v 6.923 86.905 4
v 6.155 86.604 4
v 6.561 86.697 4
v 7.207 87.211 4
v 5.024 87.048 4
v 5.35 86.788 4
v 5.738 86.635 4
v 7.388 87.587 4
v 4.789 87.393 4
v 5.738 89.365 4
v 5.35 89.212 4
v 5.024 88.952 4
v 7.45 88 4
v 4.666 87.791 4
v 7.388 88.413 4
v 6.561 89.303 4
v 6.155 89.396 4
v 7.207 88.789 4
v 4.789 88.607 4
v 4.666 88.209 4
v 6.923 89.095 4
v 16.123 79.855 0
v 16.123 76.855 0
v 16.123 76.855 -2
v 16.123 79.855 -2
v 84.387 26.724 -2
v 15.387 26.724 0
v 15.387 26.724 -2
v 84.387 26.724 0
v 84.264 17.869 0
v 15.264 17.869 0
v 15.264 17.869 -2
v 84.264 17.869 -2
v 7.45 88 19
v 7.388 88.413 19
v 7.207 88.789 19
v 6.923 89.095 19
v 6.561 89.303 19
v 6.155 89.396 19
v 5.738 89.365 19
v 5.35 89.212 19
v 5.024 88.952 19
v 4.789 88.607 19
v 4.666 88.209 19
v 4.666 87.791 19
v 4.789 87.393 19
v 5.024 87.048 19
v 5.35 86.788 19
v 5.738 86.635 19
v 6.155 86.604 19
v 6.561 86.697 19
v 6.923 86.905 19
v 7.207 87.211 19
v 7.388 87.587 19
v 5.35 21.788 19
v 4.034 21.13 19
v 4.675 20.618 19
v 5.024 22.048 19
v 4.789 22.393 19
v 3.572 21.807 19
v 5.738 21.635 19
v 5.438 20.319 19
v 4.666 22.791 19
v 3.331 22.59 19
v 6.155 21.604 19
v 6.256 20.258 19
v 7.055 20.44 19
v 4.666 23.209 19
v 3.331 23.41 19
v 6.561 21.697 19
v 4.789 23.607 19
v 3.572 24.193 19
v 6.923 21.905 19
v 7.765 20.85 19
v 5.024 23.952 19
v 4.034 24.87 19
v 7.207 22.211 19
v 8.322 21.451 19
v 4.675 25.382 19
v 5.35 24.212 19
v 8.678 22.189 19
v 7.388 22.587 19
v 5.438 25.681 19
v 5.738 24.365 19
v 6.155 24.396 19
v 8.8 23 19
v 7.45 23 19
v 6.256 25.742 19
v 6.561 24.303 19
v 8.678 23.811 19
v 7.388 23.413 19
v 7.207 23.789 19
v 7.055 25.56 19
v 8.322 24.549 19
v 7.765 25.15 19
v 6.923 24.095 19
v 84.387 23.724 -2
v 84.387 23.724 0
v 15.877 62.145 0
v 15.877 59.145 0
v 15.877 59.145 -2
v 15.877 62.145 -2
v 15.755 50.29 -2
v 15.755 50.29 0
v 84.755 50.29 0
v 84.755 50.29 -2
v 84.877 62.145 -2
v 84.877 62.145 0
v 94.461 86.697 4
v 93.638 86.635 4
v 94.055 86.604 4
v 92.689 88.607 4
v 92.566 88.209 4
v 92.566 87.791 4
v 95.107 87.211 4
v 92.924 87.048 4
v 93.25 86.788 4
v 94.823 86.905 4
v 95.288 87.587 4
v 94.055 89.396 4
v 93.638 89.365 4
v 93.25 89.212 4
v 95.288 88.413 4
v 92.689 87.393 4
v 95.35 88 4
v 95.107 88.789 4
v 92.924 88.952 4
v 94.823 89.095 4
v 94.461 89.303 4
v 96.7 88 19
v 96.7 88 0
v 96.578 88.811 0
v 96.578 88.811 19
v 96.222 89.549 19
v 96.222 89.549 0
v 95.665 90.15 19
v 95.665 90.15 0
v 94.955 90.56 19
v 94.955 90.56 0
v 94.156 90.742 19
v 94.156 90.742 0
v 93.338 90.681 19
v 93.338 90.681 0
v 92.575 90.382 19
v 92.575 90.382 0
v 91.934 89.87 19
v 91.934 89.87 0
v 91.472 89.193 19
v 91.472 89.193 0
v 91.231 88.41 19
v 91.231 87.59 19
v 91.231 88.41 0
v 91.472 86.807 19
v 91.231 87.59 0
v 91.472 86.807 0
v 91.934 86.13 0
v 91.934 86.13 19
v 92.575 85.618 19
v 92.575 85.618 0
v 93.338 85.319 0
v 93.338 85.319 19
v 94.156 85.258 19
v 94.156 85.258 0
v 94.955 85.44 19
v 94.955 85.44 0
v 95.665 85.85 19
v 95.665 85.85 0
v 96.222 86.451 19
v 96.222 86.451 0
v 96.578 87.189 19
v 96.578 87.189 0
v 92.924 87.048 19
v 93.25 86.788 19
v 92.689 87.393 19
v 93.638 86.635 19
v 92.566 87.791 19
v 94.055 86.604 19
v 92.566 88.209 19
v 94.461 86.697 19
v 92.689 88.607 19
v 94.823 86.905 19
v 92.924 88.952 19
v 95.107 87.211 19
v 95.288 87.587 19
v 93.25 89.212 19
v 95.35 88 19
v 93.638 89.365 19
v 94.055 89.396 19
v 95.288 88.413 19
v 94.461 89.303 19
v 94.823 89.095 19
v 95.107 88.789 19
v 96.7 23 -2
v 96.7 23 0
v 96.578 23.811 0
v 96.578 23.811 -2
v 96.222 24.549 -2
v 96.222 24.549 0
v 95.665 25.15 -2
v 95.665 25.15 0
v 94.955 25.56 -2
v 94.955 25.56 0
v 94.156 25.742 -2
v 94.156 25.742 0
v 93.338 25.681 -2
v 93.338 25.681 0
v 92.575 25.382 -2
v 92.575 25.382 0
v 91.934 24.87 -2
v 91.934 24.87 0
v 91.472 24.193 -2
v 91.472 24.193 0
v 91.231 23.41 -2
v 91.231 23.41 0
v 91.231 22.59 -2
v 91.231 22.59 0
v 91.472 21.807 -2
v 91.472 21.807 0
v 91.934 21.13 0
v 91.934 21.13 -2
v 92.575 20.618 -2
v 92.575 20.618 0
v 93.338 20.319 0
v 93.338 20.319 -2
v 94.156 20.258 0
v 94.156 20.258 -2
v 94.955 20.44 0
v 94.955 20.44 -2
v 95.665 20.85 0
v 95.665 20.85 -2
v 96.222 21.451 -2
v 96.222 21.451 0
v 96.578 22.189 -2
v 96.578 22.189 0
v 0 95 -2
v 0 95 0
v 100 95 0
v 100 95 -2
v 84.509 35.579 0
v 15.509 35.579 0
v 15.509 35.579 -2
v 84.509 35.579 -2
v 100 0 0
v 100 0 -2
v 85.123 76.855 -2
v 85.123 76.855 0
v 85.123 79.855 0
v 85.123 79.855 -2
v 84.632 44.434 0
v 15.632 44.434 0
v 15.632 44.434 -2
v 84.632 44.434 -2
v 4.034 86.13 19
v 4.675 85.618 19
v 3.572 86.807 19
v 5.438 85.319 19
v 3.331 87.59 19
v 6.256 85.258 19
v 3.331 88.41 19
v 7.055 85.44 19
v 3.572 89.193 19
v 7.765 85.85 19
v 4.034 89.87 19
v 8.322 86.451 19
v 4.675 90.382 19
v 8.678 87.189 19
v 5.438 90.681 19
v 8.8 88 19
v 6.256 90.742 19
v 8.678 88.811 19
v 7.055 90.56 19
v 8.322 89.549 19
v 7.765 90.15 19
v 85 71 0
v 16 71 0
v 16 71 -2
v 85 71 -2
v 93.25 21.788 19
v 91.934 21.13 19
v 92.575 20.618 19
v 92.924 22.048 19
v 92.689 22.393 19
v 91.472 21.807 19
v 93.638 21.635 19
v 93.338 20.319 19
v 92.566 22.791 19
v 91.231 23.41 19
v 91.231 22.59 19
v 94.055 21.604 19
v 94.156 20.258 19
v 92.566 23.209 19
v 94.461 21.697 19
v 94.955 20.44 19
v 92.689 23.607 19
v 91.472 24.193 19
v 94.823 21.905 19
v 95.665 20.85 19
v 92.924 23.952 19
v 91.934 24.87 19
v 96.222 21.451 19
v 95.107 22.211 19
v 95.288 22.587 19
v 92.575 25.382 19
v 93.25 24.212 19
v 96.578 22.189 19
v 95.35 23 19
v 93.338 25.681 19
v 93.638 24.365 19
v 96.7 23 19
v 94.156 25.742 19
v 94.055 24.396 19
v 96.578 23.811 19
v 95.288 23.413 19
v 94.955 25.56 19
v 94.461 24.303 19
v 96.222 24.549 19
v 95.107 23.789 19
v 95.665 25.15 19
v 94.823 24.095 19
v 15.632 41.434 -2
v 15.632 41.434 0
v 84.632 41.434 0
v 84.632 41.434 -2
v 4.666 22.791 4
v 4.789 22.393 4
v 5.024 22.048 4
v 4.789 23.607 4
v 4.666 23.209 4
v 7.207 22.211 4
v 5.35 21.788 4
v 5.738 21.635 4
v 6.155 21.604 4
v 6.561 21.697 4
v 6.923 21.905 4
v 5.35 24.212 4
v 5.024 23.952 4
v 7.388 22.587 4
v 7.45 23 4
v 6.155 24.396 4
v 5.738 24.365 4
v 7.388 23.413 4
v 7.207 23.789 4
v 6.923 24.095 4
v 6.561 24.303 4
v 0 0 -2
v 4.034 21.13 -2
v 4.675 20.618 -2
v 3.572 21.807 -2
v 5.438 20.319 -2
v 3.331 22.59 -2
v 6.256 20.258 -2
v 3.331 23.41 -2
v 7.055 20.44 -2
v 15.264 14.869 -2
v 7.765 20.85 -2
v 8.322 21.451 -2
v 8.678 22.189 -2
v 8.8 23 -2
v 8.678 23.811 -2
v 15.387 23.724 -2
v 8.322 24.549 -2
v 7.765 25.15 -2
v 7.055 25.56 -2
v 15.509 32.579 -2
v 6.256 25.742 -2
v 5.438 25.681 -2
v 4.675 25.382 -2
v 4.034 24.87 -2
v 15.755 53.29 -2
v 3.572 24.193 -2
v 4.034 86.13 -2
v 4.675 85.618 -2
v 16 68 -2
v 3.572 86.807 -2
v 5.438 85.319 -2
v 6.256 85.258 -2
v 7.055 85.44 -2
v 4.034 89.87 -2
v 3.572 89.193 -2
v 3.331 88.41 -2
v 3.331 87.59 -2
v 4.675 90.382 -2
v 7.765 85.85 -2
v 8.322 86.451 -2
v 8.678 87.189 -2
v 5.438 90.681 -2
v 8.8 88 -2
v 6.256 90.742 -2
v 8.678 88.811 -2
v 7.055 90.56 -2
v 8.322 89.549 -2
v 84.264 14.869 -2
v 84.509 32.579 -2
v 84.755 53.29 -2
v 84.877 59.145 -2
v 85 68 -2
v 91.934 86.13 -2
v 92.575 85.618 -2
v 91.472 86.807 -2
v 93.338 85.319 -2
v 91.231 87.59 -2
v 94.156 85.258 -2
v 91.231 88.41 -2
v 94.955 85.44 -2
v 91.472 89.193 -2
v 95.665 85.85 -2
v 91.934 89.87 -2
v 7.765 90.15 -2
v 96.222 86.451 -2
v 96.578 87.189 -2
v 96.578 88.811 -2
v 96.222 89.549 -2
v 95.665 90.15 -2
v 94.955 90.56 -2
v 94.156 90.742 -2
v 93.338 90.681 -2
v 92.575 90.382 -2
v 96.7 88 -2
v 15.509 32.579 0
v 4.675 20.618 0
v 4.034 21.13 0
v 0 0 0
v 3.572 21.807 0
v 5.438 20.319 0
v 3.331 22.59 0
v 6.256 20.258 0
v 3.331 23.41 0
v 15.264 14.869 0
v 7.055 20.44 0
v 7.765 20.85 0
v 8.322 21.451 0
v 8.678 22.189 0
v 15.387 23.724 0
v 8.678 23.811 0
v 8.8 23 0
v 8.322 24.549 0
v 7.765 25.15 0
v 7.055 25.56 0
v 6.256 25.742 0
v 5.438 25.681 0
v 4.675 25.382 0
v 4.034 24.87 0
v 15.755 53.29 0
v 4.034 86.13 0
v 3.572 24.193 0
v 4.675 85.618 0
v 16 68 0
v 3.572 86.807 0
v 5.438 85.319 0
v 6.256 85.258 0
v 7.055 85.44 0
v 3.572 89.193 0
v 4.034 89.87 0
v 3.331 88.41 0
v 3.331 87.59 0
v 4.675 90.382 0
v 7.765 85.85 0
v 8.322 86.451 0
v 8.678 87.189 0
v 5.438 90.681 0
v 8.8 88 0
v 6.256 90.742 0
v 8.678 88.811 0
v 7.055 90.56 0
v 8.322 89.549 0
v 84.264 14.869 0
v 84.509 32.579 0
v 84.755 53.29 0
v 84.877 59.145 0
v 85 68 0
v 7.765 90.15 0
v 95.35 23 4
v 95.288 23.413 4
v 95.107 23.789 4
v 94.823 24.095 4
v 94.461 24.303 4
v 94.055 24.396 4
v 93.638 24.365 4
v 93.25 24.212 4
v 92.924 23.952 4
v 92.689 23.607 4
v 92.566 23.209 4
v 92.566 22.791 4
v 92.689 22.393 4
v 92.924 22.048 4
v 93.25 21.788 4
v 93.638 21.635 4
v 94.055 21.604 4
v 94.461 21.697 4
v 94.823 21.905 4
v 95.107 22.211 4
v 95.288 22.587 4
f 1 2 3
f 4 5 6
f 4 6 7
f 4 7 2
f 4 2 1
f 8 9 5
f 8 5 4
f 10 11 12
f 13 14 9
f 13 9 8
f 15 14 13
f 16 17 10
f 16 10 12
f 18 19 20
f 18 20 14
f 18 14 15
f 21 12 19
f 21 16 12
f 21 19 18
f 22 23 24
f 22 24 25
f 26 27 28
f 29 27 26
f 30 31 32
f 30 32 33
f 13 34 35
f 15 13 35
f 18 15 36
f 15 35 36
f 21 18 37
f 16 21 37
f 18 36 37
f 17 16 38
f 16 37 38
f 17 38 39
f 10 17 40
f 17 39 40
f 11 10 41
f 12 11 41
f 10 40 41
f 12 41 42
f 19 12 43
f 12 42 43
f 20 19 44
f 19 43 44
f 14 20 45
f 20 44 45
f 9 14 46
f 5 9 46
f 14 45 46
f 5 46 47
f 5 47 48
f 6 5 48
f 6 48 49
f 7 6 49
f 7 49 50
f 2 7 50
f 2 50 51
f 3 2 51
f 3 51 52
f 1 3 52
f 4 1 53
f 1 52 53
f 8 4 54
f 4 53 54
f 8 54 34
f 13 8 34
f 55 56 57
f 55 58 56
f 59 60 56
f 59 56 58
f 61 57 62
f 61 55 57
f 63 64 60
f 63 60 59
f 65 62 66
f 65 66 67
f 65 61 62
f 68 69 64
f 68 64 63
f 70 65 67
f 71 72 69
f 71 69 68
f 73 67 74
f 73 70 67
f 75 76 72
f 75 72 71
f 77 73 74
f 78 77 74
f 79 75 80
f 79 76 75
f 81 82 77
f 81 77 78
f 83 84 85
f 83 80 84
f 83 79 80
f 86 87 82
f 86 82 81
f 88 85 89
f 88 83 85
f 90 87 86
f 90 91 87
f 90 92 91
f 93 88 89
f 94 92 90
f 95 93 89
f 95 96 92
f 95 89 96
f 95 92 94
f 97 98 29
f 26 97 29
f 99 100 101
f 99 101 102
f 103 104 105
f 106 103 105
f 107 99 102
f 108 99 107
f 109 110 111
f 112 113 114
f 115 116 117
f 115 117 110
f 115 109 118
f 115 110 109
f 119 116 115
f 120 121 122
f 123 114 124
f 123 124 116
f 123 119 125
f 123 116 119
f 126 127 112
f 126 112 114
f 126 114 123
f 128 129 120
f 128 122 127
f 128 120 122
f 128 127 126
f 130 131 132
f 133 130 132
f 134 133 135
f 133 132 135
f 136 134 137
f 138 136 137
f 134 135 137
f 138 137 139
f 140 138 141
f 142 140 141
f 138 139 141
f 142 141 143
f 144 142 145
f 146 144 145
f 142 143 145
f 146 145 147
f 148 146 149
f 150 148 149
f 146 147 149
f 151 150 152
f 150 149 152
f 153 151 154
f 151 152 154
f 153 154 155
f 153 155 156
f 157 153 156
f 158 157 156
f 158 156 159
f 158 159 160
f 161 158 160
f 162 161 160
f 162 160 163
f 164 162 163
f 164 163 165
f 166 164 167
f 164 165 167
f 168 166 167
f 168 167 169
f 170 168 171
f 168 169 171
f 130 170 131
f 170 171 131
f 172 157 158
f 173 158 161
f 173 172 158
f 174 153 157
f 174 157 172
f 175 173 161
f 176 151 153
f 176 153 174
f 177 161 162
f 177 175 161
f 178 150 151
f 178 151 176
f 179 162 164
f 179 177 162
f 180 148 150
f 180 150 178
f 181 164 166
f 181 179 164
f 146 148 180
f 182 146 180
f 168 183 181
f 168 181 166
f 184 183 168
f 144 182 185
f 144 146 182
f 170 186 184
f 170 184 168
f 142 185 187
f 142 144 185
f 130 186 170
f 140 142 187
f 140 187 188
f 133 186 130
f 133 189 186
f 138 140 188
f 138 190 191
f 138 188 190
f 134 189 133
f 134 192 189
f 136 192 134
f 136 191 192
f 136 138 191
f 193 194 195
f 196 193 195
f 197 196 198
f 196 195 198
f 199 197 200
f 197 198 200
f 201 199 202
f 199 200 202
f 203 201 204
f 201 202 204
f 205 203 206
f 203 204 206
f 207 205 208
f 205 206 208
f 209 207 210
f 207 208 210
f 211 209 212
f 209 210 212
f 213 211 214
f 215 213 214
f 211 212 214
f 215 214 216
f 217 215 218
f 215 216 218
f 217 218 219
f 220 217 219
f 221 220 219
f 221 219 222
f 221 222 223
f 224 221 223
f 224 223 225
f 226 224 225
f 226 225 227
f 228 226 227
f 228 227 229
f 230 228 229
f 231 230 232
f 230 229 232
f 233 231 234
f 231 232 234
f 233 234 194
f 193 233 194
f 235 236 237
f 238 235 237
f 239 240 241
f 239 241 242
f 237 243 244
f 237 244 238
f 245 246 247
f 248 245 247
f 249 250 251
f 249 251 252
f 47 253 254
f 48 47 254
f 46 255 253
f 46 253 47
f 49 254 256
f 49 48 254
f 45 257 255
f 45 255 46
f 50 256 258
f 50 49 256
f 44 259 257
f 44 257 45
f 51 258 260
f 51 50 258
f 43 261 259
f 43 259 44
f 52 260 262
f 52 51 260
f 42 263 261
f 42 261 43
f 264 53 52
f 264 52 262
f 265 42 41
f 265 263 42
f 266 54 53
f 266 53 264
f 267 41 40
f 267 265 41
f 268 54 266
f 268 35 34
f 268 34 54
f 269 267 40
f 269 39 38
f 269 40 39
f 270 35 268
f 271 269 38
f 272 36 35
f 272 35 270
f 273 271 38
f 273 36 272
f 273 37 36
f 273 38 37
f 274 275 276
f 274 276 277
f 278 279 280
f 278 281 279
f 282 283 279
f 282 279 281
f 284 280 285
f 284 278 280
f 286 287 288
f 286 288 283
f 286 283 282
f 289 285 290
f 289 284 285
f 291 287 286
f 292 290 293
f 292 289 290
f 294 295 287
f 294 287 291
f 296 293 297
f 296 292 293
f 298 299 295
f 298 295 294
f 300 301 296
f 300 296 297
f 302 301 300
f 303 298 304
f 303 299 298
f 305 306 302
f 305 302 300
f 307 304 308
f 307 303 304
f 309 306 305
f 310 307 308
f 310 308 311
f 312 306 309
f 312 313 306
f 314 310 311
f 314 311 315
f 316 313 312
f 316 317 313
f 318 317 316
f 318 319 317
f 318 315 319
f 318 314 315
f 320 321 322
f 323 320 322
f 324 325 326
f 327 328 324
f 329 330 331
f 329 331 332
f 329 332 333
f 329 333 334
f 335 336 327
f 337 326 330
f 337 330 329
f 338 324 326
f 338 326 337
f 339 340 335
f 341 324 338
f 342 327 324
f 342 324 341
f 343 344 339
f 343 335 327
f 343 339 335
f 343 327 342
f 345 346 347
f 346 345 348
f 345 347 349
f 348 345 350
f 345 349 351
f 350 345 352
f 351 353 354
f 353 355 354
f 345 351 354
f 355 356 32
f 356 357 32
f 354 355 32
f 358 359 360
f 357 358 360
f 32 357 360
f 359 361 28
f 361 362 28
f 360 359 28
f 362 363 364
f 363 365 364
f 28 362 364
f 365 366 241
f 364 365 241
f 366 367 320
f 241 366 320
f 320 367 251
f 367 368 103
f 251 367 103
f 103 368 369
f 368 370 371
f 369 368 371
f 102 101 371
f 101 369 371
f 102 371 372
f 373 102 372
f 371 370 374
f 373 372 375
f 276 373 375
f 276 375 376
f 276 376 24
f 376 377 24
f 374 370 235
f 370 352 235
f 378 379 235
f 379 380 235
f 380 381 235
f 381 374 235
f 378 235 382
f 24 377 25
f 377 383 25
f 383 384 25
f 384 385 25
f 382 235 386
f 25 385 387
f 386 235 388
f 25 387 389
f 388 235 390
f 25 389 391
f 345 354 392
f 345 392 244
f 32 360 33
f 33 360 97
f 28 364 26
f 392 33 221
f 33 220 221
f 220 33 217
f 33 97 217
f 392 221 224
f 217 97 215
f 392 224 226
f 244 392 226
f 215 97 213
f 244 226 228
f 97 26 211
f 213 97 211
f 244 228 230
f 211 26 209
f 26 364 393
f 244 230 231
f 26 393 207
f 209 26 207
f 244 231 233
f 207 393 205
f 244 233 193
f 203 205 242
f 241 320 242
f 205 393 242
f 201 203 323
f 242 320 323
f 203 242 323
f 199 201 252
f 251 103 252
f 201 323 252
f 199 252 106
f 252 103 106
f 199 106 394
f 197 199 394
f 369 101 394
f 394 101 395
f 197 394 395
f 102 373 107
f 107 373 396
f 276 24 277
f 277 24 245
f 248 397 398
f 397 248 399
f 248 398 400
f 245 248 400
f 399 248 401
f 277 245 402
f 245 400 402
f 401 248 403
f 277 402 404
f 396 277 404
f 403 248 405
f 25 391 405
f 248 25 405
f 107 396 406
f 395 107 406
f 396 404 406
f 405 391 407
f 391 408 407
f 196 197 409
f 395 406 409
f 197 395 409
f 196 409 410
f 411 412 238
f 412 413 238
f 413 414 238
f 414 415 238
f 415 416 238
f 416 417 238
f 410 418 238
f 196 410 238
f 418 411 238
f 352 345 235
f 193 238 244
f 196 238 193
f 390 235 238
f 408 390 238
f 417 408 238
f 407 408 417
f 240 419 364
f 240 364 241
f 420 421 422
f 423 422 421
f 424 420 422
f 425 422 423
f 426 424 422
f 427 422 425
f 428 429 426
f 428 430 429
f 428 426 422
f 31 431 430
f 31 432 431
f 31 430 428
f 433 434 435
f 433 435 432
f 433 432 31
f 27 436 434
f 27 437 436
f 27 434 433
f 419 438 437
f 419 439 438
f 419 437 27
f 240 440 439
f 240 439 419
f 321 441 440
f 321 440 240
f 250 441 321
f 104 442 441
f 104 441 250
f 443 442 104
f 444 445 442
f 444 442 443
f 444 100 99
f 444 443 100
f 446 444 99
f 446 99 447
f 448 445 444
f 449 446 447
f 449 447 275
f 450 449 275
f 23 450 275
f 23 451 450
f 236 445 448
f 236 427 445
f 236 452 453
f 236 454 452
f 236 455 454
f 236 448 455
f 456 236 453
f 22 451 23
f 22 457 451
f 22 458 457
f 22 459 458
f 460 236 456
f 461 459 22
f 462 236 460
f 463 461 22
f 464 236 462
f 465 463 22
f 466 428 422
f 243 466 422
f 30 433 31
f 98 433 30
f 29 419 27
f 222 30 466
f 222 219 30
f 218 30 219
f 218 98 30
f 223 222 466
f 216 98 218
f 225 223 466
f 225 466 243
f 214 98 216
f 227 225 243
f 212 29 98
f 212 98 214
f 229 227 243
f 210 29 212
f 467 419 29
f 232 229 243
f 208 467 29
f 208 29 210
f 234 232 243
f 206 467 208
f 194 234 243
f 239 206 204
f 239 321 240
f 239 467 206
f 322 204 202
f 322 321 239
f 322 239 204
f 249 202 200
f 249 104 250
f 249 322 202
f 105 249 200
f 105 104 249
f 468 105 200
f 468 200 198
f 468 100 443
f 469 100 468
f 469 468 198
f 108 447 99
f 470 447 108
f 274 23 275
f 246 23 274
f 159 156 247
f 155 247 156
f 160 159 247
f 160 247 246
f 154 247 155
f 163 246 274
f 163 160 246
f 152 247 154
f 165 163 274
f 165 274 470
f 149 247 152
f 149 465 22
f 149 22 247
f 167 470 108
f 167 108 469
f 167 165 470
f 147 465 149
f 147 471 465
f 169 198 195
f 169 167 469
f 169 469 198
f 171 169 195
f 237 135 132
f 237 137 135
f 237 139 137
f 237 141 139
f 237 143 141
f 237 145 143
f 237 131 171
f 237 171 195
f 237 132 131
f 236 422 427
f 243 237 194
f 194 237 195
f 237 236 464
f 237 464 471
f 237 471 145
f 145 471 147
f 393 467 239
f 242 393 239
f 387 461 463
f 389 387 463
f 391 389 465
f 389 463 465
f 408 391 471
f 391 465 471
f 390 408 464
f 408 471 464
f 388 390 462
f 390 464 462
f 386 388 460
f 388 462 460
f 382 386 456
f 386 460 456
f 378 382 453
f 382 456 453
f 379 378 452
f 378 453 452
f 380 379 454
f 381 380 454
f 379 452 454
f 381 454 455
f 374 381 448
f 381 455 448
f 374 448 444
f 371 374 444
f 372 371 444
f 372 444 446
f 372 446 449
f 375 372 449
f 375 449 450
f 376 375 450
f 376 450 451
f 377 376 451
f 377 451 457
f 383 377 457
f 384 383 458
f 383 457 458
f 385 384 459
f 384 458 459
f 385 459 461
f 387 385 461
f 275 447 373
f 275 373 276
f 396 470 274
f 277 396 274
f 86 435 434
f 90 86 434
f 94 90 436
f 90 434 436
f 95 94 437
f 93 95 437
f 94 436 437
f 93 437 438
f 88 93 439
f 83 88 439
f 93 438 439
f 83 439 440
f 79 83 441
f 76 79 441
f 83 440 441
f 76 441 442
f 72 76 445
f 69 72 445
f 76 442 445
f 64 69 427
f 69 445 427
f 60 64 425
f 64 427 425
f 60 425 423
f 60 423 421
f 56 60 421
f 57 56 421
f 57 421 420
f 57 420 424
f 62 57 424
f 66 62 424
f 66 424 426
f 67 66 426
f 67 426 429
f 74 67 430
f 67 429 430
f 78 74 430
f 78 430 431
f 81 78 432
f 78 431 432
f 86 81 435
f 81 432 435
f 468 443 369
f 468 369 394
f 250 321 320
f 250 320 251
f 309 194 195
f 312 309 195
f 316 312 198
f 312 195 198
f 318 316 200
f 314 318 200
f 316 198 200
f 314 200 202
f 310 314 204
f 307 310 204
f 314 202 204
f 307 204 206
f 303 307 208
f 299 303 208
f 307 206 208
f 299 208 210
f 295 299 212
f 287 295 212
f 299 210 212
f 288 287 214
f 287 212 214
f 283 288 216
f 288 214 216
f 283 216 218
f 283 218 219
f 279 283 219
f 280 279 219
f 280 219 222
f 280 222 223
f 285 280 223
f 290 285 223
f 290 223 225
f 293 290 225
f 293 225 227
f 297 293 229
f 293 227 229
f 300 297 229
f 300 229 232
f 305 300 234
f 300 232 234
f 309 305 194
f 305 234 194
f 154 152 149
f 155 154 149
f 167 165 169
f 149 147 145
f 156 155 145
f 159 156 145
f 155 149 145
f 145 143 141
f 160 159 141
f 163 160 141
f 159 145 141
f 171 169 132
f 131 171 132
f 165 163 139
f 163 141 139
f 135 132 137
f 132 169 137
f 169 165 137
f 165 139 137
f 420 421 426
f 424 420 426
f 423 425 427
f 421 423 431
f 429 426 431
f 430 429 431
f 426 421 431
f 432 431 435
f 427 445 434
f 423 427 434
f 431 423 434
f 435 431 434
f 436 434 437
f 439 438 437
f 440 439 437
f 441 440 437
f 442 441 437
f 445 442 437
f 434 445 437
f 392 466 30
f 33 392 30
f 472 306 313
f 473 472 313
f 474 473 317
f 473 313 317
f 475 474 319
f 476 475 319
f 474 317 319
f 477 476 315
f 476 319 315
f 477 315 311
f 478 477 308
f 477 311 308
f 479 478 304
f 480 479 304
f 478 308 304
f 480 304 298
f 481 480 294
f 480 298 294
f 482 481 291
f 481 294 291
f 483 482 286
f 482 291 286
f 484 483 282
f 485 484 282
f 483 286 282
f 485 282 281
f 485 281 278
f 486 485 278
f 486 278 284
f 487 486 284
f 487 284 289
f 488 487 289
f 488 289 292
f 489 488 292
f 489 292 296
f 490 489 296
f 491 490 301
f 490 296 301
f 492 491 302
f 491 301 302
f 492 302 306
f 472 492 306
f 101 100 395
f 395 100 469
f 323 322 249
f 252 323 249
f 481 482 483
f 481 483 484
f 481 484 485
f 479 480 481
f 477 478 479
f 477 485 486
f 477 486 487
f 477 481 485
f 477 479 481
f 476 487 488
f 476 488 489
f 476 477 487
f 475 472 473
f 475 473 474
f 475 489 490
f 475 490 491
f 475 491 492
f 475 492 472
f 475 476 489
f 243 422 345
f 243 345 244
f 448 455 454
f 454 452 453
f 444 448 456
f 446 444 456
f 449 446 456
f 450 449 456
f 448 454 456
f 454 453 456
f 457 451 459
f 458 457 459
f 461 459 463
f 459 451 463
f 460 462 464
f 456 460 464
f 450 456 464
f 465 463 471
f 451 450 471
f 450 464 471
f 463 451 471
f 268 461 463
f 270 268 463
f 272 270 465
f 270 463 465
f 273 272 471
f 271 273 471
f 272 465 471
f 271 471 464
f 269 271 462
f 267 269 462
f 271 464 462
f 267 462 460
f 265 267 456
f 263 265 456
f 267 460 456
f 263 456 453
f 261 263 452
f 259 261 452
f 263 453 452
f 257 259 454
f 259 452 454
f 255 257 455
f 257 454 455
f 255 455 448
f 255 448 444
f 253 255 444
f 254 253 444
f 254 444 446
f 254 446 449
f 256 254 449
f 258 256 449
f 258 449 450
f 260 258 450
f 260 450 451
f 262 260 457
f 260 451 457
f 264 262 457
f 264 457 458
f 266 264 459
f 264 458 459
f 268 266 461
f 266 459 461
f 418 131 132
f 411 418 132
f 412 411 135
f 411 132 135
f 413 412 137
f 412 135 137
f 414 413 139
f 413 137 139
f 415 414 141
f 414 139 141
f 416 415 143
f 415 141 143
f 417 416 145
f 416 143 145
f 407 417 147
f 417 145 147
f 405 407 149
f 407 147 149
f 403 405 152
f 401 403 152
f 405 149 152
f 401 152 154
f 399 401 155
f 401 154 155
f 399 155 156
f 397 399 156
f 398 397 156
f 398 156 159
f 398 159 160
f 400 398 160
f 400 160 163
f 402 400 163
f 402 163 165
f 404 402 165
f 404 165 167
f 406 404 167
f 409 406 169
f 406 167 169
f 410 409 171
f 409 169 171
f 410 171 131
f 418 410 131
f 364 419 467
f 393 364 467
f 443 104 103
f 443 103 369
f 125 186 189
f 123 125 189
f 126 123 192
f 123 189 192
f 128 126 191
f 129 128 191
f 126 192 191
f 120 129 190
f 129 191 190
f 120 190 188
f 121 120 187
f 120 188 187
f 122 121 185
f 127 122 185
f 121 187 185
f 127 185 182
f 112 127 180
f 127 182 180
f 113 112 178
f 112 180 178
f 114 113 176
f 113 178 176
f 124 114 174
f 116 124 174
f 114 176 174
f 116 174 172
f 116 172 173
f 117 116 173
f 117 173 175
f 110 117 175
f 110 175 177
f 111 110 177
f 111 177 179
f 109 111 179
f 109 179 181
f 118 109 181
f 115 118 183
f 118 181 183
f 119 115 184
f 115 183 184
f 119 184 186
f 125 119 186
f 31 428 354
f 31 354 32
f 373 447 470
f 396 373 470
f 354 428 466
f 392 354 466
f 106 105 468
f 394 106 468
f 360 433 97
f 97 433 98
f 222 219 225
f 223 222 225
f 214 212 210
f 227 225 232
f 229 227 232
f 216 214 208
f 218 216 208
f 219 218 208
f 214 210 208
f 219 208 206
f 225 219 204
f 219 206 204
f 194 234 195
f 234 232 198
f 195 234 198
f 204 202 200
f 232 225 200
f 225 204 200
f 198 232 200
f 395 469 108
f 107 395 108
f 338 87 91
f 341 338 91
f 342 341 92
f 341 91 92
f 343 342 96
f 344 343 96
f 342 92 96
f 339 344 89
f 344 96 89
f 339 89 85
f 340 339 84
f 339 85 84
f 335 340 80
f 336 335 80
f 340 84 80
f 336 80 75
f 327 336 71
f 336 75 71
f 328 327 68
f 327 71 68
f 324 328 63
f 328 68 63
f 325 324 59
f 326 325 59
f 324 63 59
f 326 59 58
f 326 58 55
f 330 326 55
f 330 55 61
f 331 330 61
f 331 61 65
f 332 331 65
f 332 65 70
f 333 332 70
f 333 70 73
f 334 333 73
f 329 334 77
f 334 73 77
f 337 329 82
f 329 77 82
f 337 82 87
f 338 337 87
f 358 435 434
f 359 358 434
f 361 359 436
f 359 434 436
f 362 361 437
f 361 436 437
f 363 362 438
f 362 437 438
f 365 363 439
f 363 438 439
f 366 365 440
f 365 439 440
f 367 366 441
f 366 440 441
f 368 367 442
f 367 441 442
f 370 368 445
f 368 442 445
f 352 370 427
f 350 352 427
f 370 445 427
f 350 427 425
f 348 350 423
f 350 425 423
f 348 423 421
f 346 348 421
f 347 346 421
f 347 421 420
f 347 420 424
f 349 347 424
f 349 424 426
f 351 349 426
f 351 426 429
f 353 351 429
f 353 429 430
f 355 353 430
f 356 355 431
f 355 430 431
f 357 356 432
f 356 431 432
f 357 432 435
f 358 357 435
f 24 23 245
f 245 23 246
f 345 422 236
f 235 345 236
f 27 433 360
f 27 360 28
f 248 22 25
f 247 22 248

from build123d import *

# Parameters (mm, degrees)
F0_W     = 100
F0_H     = 95
F0_R     = 2.75
F0_W_2   = 69
F0_H_2   = 3
F1_DEPTH = 2
F2_DEPTH = 19
F3_R     = 1.4
F4_DEPTH = 15


with BuildPart() as f1:
    # F0 (on Top) → F1 (new body)
    with BuildSketch(Plane.XY):
        with Locations((50, 47.5)):
            Rectangle(F0_W, F0_H)
        with Locations((6.05, 23)):
            Circle(F0_R, mode=Mode.SUBTRACT)
        with Locations((49.763863, 16.368994)):
            Rectangle(F0_W_2, F0_H_2, mode=Mode.SUBTRACT)
        with Locations((49.886553, 25.224161)):
            Rectangle(F0_W_2, F0_H_2, mode=Mode.SUBTRACT)
        with Locations((93.95, 23)):
            Circle(F0_R, mode=Mode.SUBTRACT)
        with Locations((50.009242, 34.079329)):
            Rectangle(F0_W_2, F0_H_2, mode=Mode.SUBTRACT)
        with Locations((50.131932, 42.934497)):
            Rectangle(F0_W_2, F0_H_2, mode=Mode.SUBTRACT)
        with Locations((6.05, 88)):
            Circle(F0_R, mode=Mode.SUBTRACT)
        with Locations((50.254621, 51.789665)):
            Rectangle(F0_W_2, F0_H_2, mode=Mode.SUBTRACT)
        with Locations((50.377311, 60.644832)):
            Rectangle(F0_W_2, F0_H_2, mode=Mode.SUBTRACT)
        with Locations((50.5, 69.5)):
            Rectangle(F0_W_2, F0_H_2, mode=Mode.SUBTRACT)
        with Locations((50.622689, 78.355168)):
            Rectangle(F0_W_2, F0_H_2, mode=Mode.SUBTRACT)
        with Locations((93.95, 88)):
            Circle(F0_R, mode=Mode.SUBTRACT)
    extrude(amount=-F1_DEPTH)


with BuildPart() as f2:
    # F0 (on Top) → F2 (new body)
    with BuildSketch(Plane.XY):
        with Locations((6.05, 88)):
            Circle(F0_R)
        with Locations((93.95, 88)):
            Circle(F0_R)
        with Locations((93.95, 23)):
            Circle(F0_R)
        with Locations((6.05, 23)):
            Circle(F0_R)
    extrude(amount=F2_DEPTH)

    # F3 (on face) → F4 (cut)
    with BuildSketch(Plane.XY.offset(19)):
        with Locations((6.05, 88)):
            Circle(F3_R)
        with Locations((93.95, 88)):
            Circle(F3_R)
        with Locations((6.05, 23)):
            Circle(F3_R)
        with Locations((93.95, 23)):
            Circle(F3_R)
    extrude(amount=-F4_DEPTH, mode=Mode.SUBTRACT)


solid = Compound([f1.part, f2.part])
